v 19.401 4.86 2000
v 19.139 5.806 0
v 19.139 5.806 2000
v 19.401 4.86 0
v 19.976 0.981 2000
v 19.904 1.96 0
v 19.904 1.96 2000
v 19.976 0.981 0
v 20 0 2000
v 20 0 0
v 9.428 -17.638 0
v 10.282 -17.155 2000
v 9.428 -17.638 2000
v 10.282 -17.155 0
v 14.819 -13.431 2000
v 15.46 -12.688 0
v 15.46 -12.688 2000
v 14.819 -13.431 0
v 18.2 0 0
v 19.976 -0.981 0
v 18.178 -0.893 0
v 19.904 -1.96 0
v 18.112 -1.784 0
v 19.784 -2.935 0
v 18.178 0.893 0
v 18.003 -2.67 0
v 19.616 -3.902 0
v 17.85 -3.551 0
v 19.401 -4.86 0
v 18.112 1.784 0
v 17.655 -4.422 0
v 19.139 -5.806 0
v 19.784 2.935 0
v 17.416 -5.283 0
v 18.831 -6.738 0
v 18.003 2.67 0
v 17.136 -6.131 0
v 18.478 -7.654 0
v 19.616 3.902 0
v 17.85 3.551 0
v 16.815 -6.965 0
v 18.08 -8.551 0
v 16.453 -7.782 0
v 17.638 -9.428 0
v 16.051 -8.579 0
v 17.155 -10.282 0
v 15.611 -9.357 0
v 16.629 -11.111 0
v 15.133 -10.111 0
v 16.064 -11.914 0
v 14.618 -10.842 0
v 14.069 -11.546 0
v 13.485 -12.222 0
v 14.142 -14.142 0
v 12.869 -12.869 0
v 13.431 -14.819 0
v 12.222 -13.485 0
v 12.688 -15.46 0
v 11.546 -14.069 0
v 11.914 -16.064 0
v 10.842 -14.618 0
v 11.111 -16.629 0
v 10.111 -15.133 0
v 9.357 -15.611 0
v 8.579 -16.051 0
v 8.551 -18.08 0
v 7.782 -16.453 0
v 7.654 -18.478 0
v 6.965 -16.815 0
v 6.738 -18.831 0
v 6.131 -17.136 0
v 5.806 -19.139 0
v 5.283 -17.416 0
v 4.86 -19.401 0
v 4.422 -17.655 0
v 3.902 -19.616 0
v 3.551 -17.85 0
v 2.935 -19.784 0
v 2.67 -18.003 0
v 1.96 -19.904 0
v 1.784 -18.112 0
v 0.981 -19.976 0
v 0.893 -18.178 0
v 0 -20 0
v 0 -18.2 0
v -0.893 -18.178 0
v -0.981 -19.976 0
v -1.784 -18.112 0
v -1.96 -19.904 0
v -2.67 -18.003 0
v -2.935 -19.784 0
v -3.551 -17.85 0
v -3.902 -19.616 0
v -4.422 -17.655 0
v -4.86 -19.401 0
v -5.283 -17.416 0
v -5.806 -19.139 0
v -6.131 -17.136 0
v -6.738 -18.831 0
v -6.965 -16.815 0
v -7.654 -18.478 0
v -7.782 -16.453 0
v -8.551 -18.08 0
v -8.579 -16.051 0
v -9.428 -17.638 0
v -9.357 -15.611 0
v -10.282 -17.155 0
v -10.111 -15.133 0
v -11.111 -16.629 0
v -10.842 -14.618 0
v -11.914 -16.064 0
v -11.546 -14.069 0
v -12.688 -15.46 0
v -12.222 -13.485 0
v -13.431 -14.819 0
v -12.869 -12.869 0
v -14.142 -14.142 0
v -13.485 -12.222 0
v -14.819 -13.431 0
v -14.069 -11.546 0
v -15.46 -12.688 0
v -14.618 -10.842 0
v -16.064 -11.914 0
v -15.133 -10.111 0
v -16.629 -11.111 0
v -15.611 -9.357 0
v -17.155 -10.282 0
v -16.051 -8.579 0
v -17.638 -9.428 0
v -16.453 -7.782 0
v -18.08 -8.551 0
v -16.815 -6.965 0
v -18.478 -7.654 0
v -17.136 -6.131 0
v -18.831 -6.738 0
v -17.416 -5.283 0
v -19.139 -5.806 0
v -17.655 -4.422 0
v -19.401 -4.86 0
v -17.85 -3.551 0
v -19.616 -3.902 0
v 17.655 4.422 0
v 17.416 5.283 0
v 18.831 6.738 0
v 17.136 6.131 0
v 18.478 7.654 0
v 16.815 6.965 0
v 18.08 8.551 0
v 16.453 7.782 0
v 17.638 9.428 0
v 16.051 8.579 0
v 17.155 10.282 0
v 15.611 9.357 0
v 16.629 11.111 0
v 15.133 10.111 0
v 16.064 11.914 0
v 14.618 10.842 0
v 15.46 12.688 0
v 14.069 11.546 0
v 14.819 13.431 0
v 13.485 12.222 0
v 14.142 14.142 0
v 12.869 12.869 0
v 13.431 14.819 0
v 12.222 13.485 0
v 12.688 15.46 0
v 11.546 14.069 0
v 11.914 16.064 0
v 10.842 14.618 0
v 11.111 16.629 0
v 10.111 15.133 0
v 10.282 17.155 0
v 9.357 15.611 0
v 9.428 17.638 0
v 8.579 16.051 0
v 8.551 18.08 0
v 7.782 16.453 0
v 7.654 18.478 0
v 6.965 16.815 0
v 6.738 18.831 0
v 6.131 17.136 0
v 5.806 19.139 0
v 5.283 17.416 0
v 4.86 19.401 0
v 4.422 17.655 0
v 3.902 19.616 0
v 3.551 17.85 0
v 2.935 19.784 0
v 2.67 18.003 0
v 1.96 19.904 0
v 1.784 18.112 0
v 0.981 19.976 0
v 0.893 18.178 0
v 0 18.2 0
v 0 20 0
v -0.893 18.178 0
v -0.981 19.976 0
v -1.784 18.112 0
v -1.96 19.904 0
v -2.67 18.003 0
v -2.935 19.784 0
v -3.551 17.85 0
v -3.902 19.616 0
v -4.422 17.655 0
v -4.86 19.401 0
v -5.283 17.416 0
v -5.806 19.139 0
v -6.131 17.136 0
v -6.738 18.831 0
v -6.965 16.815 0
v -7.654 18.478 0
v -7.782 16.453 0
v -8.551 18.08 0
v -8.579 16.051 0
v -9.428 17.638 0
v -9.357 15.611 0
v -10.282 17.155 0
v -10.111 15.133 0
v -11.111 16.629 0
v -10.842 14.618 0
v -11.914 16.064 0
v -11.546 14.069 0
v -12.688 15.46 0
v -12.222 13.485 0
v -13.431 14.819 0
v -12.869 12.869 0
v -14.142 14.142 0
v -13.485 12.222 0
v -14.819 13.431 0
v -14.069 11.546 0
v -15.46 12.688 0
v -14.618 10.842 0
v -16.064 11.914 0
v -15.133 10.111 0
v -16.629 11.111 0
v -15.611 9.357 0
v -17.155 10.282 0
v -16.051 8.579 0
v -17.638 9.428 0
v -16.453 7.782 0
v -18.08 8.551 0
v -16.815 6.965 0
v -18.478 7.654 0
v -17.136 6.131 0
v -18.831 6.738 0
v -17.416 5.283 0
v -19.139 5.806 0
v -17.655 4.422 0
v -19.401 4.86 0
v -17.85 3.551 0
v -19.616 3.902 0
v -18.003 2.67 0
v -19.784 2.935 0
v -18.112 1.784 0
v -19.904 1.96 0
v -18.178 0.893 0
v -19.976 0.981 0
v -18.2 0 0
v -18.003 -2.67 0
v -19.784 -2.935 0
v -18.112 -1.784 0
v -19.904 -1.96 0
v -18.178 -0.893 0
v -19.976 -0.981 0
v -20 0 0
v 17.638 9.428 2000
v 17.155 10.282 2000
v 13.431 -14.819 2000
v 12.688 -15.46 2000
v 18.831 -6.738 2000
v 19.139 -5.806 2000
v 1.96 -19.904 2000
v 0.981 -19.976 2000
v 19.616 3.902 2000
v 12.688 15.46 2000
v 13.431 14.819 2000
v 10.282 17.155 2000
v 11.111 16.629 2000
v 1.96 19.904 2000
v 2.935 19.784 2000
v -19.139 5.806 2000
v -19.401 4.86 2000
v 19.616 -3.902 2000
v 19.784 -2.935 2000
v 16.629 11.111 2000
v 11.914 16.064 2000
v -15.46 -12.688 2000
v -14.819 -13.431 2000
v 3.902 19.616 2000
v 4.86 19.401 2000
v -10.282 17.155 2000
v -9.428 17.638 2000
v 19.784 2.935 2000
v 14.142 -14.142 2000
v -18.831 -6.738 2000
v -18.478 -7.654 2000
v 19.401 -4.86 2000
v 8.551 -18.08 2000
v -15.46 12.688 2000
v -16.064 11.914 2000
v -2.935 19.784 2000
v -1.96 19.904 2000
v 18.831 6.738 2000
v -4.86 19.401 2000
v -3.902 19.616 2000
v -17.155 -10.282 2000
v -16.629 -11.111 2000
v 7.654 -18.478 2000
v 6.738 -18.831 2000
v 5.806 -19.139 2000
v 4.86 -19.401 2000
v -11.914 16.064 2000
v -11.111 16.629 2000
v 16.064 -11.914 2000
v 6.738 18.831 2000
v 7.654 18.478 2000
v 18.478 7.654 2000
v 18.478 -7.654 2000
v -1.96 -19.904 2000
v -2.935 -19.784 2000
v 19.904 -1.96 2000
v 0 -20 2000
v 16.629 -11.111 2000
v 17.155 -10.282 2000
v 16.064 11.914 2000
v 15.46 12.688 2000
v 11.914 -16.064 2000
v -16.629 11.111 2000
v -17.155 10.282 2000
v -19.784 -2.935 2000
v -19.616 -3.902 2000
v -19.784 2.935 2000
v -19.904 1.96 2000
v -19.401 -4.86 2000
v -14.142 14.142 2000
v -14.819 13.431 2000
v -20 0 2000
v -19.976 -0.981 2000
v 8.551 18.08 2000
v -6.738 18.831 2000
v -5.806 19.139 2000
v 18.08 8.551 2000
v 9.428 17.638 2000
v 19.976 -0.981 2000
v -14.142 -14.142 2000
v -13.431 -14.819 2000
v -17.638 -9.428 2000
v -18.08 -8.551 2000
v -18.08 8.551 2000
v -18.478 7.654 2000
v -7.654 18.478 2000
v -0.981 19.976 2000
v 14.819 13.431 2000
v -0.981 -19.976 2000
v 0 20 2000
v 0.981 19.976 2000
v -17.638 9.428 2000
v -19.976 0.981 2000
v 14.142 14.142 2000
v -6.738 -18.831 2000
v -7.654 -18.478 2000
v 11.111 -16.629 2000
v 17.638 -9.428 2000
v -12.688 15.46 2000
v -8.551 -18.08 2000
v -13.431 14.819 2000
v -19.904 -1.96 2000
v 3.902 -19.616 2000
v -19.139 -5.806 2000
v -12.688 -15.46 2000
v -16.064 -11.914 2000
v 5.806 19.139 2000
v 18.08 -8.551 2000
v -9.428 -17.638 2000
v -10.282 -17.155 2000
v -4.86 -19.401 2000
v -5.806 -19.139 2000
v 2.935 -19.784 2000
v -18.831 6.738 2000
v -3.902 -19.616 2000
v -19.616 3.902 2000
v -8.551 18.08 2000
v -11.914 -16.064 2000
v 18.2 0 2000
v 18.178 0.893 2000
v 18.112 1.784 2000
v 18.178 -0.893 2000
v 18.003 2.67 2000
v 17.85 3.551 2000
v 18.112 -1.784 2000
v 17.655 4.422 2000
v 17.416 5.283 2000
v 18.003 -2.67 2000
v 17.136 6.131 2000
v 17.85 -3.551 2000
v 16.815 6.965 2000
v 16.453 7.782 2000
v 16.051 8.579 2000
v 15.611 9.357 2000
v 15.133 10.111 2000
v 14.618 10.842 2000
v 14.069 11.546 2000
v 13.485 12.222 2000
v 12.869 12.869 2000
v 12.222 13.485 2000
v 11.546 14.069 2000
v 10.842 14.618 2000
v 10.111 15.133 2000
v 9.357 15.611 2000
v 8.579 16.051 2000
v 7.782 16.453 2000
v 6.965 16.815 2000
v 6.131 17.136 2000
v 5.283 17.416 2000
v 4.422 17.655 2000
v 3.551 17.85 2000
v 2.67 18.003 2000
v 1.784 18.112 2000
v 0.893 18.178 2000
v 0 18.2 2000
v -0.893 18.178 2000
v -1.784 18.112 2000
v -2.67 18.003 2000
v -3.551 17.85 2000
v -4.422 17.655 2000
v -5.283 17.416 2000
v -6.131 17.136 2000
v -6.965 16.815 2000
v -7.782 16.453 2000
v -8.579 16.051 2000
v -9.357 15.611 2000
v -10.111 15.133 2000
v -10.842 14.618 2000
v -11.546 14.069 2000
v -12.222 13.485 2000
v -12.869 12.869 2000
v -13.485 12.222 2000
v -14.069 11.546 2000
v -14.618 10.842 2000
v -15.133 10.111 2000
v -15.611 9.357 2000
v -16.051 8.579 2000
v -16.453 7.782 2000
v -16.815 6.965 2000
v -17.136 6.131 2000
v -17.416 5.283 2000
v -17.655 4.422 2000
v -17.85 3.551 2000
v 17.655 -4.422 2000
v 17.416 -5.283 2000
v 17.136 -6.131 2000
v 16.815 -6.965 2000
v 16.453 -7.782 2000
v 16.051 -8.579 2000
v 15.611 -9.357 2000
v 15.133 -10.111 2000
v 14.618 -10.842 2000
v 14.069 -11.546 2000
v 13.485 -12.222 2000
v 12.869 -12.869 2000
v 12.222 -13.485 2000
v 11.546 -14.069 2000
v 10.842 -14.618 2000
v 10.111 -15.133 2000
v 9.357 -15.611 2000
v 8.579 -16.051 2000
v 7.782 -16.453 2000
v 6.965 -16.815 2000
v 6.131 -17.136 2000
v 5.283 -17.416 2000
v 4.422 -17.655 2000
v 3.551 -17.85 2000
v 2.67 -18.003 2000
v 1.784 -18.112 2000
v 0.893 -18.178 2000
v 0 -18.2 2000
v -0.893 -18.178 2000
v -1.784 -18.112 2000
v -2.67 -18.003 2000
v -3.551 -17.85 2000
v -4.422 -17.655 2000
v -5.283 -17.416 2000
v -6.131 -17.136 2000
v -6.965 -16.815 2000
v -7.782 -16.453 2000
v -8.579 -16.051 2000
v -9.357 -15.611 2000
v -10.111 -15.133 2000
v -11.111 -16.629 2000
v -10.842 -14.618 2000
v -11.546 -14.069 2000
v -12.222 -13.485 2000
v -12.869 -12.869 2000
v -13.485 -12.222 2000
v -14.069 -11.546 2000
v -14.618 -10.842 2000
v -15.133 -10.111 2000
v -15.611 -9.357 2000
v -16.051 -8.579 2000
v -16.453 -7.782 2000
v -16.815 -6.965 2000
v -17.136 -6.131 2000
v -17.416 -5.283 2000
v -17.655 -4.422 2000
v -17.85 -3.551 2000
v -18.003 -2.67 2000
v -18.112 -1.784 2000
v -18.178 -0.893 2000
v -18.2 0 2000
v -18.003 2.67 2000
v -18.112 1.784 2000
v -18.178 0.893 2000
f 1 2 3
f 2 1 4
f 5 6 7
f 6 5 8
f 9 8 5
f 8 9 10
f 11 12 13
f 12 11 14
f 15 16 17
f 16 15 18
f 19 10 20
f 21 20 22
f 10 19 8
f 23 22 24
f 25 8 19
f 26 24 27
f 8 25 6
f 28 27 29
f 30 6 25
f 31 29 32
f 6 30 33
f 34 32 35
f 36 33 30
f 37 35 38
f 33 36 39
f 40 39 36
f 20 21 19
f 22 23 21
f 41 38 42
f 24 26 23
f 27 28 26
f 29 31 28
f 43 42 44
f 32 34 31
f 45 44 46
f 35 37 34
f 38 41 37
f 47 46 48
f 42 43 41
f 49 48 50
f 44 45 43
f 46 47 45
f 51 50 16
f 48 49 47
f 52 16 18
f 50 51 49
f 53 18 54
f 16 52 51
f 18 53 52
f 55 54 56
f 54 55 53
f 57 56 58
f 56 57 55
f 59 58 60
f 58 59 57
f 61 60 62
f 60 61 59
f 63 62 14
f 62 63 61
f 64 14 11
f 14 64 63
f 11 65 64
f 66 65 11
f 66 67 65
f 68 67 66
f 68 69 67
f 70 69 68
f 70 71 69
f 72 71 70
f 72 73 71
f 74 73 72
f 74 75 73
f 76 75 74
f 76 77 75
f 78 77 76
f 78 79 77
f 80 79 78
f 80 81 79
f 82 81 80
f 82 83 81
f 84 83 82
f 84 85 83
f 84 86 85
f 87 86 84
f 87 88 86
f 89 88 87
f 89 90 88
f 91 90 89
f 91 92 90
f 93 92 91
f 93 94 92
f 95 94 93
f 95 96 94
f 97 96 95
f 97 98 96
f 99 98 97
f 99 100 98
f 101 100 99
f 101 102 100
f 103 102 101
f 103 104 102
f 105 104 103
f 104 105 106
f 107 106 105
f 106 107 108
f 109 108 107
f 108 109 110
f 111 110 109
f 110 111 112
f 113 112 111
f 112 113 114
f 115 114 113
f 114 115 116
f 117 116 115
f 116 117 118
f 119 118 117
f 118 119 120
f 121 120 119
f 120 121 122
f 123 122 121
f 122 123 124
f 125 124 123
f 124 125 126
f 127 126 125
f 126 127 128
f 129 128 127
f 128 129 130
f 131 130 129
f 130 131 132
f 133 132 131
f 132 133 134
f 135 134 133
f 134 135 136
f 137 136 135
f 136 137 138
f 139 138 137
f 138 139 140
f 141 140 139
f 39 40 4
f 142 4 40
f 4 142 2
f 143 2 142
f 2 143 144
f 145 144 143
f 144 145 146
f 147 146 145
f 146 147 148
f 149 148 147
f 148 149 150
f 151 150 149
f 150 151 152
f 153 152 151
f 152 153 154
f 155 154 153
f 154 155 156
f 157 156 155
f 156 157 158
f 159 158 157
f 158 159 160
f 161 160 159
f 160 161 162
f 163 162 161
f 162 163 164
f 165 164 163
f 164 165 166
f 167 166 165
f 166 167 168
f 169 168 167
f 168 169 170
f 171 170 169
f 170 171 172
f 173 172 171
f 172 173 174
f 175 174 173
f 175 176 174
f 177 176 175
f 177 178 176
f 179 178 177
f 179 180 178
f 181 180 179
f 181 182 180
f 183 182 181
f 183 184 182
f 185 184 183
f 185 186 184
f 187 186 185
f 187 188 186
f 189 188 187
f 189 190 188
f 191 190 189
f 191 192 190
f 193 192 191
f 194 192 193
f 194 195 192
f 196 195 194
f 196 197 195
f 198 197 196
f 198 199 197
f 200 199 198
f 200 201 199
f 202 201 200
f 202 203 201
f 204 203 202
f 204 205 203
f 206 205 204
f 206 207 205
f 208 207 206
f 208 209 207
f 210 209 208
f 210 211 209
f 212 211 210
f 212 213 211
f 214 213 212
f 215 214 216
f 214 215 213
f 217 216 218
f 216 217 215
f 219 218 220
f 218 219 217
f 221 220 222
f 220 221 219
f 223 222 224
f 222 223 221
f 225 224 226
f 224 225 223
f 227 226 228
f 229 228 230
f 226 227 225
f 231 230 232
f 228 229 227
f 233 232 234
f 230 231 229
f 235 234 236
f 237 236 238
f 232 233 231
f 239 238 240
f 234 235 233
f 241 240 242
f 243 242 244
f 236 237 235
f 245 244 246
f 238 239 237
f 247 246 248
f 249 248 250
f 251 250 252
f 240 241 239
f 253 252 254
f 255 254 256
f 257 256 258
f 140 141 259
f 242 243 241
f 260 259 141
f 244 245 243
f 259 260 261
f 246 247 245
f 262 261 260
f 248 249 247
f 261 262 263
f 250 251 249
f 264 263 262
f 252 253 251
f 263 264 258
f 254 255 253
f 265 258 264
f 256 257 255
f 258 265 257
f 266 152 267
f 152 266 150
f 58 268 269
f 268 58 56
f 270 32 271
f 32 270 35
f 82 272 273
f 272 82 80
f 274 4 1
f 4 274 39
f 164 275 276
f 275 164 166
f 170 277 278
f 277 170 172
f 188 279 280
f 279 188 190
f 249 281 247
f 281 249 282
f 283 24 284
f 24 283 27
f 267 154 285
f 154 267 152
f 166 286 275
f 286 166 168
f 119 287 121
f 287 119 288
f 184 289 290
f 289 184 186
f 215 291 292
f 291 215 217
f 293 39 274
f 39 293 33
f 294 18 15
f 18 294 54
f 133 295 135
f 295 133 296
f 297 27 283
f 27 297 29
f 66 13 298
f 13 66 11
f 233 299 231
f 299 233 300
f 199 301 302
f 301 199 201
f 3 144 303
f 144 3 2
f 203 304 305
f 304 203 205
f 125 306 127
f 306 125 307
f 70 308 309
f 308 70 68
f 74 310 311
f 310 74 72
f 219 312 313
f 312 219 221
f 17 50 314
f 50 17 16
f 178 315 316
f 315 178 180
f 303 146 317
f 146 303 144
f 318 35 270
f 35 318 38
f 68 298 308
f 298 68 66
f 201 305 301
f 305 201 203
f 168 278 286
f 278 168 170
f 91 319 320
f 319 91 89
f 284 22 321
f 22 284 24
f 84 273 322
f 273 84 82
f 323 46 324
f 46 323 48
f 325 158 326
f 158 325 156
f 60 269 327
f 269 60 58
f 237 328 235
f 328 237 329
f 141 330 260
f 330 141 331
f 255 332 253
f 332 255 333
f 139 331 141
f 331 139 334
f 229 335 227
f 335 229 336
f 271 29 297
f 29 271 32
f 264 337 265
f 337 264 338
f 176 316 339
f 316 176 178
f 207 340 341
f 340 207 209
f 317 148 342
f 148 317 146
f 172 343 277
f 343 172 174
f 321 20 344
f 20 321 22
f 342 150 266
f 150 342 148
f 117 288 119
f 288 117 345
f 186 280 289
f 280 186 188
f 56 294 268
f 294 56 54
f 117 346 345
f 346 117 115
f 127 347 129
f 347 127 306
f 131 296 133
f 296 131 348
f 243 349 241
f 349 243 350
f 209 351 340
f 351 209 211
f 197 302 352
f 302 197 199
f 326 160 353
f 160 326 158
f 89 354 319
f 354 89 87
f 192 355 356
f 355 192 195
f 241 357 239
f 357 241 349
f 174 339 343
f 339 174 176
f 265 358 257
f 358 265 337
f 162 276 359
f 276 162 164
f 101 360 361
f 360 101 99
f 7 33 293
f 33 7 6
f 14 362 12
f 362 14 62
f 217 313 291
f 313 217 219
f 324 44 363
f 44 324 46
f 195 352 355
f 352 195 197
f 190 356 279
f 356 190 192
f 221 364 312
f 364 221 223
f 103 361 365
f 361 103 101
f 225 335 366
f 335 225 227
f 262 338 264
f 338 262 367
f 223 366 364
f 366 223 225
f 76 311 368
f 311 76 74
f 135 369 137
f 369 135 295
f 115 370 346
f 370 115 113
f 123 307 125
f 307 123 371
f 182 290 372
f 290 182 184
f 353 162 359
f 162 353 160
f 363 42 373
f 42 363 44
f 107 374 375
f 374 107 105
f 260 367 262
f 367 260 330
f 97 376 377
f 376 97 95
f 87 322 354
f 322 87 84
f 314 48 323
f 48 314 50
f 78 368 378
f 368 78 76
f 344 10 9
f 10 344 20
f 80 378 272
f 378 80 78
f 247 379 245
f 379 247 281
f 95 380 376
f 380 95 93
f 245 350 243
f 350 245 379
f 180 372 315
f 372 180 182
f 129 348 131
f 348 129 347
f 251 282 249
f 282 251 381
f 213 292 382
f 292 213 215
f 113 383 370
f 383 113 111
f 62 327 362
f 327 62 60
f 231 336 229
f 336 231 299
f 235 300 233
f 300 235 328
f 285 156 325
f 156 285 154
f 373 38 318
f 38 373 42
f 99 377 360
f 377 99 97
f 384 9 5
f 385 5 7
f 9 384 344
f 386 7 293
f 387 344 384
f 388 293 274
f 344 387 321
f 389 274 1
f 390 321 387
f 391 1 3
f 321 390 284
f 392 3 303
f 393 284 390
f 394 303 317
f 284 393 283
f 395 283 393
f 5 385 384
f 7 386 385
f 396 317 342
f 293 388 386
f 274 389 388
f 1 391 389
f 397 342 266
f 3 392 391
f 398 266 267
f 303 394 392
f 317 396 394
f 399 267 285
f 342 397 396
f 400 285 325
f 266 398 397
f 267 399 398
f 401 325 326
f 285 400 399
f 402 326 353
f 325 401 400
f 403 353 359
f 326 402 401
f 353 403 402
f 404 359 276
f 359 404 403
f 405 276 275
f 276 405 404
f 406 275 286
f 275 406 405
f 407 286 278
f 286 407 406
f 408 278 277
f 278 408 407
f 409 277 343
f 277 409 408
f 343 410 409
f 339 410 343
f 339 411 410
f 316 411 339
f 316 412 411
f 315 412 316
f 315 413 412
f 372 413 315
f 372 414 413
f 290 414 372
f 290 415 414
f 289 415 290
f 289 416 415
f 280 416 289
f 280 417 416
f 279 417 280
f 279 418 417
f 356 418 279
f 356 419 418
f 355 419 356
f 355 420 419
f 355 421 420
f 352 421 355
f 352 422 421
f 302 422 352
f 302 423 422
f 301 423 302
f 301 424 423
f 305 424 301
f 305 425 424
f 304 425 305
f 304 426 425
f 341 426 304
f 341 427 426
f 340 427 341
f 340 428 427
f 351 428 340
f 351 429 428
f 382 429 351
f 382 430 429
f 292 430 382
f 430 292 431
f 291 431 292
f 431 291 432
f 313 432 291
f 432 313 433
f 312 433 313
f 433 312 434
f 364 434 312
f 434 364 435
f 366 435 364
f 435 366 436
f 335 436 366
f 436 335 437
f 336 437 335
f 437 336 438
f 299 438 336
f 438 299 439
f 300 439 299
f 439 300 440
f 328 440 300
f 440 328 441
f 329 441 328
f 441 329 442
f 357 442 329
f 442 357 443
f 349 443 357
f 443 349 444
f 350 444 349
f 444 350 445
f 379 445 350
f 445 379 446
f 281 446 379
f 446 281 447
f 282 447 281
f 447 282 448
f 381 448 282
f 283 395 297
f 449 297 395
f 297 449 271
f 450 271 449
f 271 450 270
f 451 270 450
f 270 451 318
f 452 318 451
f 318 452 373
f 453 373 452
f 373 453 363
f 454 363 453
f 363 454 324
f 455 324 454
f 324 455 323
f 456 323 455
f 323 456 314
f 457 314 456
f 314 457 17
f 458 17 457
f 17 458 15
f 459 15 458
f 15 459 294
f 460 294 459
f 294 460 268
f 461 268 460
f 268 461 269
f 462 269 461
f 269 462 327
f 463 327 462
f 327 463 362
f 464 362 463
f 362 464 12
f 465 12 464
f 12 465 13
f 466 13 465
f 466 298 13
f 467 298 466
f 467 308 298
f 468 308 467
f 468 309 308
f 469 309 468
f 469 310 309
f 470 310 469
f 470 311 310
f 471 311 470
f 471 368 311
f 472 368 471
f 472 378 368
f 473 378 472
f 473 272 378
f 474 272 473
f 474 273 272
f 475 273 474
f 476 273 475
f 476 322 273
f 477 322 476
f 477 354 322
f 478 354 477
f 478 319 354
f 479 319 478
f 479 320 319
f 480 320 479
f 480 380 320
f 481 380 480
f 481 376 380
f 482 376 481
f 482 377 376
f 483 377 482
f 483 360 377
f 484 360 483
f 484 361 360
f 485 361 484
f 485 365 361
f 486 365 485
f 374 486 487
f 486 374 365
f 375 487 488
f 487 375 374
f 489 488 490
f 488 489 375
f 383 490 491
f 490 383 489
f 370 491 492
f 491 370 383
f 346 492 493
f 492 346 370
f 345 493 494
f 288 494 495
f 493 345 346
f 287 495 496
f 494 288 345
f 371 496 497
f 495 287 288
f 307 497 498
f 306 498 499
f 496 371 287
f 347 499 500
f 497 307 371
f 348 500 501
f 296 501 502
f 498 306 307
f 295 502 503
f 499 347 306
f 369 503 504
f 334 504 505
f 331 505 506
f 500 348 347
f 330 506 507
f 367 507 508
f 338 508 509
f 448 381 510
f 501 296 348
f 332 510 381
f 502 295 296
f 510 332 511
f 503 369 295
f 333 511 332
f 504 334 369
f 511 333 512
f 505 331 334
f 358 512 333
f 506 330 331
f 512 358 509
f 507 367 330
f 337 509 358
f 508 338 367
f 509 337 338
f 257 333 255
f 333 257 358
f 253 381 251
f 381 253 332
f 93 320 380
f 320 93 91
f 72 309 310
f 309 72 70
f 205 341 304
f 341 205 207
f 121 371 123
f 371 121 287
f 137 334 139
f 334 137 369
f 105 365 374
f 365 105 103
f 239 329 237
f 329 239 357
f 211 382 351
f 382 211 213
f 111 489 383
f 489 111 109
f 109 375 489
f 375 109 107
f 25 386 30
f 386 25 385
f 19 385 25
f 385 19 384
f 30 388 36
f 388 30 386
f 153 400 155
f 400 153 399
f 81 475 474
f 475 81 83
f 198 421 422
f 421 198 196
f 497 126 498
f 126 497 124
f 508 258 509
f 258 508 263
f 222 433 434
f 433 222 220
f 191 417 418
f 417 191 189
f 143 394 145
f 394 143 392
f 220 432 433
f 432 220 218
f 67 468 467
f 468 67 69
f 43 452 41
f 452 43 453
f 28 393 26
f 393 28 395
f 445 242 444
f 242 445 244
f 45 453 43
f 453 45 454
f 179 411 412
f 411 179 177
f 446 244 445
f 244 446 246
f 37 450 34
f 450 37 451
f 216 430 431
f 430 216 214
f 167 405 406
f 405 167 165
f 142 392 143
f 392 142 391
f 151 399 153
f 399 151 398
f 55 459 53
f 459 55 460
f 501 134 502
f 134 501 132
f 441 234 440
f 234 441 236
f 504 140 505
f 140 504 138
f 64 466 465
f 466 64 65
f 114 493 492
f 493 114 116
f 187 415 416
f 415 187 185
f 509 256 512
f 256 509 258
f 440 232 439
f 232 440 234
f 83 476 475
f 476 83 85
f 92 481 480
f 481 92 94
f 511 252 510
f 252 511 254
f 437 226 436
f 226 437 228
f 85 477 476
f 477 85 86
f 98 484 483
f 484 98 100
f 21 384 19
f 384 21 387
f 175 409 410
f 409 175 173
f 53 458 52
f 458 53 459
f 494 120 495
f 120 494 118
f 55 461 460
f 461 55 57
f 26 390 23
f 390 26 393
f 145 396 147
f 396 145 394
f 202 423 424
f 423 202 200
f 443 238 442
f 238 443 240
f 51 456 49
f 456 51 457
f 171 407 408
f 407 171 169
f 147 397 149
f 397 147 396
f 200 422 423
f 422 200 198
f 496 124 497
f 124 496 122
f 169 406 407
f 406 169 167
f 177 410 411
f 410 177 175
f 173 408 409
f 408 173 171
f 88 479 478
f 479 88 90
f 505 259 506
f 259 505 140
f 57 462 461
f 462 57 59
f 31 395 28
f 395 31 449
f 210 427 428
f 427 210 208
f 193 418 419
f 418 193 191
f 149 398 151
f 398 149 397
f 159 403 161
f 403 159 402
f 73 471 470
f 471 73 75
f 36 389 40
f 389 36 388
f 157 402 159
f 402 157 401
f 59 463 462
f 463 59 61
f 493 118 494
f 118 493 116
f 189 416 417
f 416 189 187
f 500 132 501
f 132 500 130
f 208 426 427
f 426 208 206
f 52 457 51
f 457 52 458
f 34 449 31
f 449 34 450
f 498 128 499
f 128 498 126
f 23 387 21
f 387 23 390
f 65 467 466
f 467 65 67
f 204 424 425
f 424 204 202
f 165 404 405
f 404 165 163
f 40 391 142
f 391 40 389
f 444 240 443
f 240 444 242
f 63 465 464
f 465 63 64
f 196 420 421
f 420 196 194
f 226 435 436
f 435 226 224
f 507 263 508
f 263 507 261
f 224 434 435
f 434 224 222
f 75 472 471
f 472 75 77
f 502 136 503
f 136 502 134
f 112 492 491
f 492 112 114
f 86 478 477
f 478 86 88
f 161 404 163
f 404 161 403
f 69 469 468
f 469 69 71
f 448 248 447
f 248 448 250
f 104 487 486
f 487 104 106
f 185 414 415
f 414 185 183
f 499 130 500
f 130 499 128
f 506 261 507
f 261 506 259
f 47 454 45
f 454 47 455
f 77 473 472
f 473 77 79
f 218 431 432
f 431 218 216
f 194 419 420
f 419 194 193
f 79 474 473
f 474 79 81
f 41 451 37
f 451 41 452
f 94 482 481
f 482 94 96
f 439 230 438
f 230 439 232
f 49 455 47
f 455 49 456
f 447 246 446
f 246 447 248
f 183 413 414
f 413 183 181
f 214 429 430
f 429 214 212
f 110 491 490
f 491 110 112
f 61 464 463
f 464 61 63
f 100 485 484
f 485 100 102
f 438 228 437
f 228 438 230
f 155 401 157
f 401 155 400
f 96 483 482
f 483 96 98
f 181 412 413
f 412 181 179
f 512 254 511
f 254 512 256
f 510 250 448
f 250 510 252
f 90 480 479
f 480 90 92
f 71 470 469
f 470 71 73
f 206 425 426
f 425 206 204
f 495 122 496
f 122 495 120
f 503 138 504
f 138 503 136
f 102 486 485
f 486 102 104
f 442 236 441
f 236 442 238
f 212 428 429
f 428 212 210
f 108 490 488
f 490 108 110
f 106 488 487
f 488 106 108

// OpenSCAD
$fn = 128;

// HT pipe (approximation): DN40, length 2000 mm
// Typical HT DN40 dimensions: OD ~ 40 mm, wall ~ 1.8 mm (varies by manufacturer)
pipe_length = 2000;
outer_d = 40;
wall = 1.8;
inner_d = outer_d - 2*wall;

module ht_pipe(len, od, id) {
    difference() {
        cylinder(h = len, d = od, center = false);
        translate([0,0,-0.5])
            cylinder(h = len + 1, d = id, center = false);
    }
}

ht_pipe(pipe_length, outer_d, inner_d);
